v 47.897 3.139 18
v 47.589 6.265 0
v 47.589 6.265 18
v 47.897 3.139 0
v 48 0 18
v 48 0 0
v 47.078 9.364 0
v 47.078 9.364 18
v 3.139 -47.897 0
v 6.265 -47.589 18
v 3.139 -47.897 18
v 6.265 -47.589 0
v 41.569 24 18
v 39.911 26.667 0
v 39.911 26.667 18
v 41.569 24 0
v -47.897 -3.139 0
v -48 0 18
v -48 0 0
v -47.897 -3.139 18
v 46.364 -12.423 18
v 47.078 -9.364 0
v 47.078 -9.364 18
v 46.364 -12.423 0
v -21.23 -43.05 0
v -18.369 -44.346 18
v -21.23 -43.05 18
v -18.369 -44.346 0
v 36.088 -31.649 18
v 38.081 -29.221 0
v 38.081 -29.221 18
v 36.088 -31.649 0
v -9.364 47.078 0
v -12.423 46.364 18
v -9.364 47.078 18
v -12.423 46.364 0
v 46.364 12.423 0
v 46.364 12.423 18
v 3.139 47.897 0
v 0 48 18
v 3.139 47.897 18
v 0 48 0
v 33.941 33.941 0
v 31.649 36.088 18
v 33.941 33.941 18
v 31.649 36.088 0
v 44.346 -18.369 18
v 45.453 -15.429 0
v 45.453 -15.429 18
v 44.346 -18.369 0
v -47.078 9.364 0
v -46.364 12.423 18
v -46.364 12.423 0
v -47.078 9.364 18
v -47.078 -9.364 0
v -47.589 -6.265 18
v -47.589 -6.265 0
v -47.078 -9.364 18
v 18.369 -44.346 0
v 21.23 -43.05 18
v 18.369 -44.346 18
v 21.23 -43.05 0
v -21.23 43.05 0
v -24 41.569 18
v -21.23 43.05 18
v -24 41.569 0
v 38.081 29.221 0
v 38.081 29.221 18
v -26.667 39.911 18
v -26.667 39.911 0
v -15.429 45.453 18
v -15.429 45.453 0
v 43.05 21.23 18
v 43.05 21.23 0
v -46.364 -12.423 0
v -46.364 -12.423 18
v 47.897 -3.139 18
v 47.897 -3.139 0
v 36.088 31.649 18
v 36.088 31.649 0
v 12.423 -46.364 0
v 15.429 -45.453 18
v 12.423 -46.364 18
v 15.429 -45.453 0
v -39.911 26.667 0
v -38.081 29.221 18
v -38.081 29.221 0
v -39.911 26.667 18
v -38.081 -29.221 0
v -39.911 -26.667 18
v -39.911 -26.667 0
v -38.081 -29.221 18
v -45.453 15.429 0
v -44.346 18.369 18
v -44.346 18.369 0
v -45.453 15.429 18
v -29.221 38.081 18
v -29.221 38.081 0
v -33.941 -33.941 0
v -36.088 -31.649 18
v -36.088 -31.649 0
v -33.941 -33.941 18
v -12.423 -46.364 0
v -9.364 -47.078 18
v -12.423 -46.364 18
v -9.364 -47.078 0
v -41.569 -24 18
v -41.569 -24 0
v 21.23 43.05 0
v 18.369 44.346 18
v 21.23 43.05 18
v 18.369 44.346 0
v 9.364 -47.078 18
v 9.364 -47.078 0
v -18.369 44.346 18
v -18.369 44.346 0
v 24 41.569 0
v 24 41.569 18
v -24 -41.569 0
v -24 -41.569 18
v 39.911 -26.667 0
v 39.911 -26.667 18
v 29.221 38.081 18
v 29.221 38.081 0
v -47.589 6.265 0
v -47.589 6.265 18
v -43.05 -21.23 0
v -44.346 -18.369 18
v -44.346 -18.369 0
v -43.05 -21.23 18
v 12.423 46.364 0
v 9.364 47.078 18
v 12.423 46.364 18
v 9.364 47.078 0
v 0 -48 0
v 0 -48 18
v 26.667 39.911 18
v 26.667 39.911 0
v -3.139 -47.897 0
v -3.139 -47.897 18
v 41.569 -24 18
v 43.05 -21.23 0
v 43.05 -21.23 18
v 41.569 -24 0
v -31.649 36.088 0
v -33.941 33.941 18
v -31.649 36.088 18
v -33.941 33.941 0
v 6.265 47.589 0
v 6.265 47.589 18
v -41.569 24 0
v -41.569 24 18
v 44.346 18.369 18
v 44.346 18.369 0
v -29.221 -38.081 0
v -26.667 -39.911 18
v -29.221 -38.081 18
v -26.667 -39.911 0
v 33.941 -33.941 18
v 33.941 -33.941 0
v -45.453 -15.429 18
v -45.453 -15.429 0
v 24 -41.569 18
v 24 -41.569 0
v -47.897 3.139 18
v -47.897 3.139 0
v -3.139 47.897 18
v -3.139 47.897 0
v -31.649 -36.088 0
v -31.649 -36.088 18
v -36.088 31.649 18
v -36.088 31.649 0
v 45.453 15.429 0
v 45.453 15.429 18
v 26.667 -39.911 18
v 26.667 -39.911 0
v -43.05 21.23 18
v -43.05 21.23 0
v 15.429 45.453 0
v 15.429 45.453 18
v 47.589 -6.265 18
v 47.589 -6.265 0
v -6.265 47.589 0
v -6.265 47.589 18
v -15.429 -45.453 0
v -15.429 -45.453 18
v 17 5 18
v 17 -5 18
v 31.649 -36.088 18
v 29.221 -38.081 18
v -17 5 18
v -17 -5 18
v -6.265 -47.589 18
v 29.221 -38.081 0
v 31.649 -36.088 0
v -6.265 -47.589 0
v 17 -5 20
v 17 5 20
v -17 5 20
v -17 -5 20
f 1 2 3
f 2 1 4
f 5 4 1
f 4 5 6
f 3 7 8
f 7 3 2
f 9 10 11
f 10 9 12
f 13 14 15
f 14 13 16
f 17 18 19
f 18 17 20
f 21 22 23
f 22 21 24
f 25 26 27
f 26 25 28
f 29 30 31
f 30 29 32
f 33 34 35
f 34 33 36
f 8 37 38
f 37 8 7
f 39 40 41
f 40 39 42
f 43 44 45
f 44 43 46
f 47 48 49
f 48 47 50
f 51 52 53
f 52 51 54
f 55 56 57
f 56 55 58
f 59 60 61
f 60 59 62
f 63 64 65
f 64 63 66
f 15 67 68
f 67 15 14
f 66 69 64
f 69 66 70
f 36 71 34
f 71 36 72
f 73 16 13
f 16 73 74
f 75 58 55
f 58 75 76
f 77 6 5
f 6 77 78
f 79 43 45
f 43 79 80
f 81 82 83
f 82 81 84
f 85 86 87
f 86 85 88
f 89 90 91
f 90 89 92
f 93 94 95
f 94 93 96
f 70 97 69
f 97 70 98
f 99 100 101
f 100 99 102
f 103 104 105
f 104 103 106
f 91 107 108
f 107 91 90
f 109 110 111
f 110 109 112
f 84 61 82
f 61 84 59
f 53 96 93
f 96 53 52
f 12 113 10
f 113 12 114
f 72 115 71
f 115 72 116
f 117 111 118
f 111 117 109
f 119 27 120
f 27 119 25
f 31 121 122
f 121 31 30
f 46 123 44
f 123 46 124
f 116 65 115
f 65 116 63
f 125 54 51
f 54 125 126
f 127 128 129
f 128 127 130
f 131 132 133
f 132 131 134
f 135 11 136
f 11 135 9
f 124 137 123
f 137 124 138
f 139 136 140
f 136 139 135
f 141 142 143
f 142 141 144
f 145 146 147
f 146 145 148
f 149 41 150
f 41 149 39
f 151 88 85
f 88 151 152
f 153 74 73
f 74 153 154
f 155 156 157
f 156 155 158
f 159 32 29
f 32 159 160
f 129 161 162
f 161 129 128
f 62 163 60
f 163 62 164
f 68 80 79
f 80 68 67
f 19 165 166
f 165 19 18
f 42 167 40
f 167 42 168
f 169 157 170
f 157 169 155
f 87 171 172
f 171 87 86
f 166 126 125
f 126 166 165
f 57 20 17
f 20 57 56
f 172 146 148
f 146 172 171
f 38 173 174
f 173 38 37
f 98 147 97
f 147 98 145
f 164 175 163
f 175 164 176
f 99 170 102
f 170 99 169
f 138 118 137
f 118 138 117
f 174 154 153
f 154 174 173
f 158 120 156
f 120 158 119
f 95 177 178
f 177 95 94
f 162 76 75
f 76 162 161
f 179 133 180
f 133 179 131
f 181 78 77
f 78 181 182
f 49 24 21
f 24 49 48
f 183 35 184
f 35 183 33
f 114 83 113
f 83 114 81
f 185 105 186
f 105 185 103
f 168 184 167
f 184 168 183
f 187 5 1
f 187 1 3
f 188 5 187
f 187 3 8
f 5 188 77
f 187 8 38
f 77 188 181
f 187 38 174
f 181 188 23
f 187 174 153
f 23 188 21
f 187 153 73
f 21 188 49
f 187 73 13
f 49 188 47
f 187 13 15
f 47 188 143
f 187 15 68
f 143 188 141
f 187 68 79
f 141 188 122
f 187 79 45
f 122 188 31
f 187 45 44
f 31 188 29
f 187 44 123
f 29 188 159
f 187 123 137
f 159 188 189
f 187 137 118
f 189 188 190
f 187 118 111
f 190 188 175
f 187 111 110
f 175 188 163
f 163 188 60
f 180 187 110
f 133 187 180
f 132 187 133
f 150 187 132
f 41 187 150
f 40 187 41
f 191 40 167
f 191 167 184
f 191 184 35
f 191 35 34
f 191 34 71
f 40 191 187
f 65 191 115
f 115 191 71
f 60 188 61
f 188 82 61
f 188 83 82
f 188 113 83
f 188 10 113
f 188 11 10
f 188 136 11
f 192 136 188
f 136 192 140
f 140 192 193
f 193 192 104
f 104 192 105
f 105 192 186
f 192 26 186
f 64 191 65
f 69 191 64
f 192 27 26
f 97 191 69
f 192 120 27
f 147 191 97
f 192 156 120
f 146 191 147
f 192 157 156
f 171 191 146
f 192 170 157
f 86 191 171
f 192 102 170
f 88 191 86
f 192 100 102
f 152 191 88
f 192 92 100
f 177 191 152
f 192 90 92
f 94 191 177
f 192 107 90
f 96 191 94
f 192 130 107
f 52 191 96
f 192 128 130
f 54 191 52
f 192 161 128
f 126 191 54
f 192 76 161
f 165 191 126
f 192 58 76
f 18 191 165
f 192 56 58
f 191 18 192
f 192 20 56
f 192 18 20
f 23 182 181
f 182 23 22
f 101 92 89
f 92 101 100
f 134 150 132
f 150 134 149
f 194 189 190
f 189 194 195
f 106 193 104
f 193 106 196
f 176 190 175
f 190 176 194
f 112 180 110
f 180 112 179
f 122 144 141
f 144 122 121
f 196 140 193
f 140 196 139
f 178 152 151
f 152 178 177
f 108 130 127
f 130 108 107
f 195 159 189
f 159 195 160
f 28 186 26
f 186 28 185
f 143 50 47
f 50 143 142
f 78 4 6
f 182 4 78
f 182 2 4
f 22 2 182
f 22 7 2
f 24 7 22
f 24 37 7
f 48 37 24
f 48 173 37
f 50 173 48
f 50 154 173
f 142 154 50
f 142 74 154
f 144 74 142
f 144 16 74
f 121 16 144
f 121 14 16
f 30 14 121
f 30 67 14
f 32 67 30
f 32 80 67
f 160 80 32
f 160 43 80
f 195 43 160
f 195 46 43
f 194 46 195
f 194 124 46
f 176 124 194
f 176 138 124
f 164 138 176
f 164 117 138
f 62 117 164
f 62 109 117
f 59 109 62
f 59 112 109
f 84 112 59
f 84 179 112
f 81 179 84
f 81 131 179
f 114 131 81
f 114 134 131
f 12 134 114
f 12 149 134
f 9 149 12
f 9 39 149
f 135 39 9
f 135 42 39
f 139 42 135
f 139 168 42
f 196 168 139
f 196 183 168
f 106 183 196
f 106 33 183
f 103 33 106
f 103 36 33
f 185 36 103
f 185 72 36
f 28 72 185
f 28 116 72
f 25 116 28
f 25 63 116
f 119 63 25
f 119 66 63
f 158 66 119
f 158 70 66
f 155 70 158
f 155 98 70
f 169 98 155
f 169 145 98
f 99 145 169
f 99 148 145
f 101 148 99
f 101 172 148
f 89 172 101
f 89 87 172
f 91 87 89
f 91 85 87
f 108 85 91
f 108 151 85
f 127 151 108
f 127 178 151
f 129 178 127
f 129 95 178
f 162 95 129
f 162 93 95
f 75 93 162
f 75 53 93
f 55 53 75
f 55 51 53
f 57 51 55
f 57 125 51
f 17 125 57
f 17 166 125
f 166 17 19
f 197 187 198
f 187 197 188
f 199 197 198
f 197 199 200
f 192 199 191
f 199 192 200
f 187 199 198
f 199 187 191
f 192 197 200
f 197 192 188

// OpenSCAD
fit_clearance = 0.35;
overall_x = 110;
overall_y = 110;
overall_z = 135;
base_d = 96; base_h = 18; rail_w = 10; rail_h = 4;
module keyed_rail(){ cube([34,rail_w,rail_h],center=true); }
module rotating_base(){ union(){ cylinder(d=base_d,h=base_h,$fn=96); translate([0,0,base_h]) keyed_rail(); } }
rotating_base();
